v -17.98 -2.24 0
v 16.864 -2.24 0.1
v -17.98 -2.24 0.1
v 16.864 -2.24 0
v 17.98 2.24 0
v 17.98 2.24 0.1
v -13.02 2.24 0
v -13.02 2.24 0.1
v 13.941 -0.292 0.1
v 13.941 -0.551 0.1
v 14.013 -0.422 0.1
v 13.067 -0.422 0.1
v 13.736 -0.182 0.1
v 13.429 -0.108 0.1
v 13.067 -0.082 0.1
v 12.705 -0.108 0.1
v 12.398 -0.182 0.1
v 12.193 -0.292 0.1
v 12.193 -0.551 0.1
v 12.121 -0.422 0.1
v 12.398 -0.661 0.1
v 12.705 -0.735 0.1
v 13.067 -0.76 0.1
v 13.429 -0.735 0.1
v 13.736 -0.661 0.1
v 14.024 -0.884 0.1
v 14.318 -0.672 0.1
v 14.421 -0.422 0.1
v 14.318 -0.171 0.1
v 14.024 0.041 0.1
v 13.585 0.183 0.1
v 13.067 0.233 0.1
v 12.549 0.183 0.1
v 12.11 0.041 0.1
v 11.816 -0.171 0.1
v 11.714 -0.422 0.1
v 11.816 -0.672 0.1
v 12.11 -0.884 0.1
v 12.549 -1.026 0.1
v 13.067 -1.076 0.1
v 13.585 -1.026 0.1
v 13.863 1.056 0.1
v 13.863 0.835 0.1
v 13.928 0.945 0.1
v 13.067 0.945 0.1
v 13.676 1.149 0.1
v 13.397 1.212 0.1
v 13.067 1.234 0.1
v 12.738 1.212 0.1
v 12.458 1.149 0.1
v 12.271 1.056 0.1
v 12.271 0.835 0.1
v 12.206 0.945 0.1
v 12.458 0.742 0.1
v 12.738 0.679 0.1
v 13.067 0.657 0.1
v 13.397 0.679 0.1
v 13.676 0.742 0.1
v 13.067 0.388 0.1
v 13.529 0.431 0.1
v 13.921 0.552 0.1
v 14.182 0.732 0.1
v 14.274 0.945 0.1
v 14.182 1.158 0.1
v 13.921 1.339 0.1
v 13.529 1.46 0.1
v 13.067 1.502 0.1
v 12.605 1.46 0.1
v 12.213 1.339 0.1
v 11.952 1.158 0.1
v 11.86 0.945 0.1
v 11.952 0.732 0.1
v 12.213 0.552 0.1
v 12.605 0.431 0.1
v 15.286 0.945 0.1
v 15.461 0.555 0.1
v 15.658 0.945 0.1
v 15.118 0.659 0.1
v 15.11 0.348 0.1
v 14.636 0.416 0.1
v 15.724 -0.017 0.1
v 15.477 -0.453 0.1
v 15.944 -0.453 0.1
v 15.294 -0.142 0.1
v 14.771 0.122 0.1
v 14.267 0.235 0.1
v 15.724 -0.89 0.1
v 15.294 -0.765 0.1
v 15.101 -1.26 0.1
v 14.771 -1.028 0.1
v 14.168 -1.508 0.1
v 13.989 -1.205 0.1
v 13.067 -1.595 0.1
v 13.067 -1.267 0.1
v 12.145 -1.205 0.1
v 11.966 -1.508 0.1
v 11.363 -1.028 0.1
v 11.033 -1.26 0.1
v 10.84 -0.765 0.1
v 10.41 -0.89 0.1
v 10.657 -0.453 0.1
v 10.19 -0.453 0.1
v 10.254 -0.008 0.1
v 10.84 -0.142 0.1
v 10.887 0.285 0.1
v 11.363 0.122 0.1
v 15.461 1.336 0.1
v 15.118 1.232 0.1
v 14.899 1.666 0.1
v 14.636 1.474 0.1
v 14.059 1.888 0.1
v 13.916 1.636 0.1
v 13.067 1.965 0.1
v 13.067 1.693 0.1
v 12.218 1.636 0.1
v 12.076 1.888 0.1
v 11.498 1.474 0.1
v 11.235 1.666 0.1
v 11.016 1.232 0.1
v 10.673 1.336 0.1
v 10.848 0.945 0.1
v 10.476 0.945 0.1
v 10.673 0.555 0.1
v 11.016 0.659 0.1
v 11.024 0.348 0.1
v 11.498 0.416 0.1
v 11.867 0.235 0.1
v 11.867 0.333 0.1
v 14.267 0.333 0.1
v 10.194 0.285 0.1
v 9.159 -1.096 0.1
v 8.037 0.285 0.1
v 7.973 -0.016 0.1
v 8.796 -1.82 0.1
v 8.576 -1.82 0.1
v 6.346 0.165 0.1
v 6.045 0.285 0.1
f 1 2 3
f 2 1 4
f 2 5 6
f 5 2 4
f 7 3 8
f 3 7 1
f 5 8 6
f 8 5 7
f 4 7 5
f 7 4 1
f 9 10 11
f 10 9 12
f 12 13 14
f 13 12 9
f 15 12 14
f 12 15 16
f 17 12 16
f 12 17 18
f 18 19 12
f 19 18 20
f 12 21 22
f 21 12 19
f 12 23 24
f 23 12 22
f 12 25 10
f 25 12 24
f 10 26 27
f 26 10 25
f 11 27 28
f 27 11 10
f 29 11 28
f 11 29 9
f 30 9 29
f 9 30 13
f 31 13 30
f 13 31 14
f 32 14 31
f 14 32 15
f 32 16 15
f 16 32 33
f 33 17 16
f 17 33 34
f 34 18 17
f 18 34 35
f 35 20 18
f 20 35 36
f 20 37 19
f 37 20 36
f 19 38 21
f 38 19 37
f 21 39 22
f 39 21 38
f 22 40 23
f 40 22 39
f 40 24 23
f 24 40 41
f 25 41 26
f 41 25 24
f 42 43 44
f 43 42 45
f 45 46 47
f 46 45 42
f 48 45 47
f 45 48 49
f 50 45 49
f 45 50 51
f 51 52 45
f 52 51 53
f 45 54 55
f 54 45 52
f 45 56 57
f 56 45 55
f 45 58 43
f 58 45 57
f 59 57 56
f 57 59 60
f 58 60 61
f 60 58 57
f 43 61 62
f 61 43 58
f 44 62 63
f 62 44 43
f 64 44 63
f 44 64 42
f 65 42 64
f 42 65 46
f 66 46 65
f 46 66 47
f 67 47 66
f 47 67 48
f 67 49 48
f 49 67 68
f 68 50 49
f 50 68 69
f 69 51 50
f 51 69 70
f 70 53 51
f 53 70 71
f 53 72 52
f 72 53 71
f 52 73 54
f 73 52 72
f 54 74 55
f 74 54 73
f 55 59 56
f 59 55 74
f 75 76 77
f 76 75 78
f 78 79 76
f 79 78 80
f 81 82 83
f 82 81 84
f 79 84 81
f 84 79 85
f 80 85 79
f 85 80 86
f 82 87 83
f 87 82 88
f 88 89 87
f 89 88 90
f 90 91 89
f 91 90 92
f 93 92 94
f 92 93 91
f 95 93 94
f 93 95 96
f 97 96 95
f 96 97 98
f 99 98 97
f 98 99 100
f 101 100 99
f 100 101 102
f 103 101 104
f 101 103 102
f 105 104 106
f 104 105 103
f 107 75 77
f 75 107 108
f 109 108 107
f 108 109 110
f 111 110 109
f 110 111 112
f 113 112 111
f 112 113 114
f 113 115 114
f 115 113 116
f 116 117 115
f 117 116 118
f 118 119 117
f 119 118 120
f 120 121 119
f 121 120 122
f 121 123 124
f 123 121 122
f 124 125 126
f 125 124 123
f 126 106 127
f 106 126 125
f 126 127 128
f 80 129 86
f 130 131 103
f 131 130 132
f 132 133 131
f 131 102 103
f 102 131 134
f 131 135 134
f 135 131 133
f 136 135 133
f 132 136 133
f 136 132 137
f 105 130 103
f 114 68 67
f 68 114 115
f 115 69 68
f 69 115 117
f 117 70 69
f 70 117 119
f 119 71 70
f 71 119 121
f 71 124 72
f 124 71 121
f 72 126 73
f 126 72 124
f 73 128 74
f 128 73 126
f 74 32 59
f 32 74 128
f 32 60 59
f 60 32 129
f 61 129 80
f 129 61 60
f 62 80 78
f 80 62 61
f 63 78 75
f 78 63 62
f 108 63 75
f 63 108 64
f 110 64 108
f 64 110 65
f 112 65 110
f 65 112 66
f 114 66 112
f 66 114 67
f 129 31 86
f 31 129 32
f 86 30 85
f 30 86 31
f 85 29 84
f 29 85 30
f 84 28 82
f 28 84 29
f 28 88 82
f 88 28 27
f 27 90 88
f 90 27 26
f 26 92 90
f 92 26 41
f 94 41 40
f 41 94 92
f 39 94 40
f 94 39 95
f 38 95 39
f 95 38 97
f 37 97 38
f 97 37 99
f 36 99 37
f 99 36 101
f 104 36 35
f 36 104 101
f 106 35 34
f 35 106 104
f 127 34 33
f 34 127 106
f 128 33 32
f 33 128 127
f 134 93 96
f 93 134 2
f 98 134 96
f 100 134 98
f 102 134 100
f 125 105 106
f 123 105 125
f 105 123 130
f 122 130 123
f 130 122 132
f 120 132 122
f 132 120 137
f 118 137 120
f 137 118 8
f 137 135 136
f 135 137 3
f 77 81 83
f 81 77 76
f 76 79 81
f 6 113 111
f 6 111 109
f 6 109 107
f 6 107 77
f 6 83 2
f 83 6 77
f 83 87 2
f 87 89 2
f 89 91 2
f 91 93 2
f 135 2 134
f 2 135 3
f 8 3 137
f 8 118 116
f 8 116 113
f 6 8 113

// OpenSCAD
use <../lib.scad>
function ldraw_lib__4125165g() = [
// 0 Sticker  0.6 x  4.5 Trapezoid with White "v8" on Right Side on Red Background
// 0 Name: 4125165g.dat
// 0 Author: Max Martin Richter [MMR1988]
// 0 !LDRAW_ORG Part UPDATE 2019-03
// 0 !LICENSE Licensed under CC BY 2.0 and CC BY 4.0 : see CAreadme.txt
// 
// 0 BFC CERTIFY CCW
  [0,"BFC","CERTIFY"],
  [0,"BFC","CCW"],
// 
// 0 !KEYWORDS Set 8448
// 
// 0 !HISTORY 2019-12-27 [PTadmin] Official Update 2019-03
// 
// 
// 4 16 42.16 -.25 -5.6 -44.95 -.25 -5.6 -44.95 0 -5.6 42.16 0 -5.6
  [4,16,42.16,-.25,-5.6,-44.95,-.25,-5.6,-44.95,0,-5.6,42.16,0,-5.6],
// 4 16 42.16 -.25 -5.6 42.16 0 -5.6 44.95 0 5.6 44.95 -.25 5.6
  [4,16,42.16,-.25,-5.6,42.16,0,-5.6,44.95,0,5.6,44.95,-.25,5.6],
// 4 16 -32.55 -.25 5.6 -32.55 0 5.6 -44.95 0 -5.6 -44.95 -.25 -5.6
  [4,16,-32.55,-.25,5.6,-32.55,0,5.6,-44.95,0,-5.6,-44.95,-.25,-5.6],
// 4 16 44.95 0 5.6 -32.55 0 5.6 -32.55 -.25 5.6 44.95 -.25 5.6
  [4,16,44.95,0,5.6,-32.55,0,5.6,-32.55,-.25,5.6,44.95,-.25,5.6],
// 4 16 -32.55 0 5.6 44.95 0 5.6 42.16 0 -5.6 -44.95 0 -5.6
  [4,16,-32.55,0,5.6,44.95,0,5.6,42.16,0,-5.6,-44.95,0,-5.6],
// 
// 4 4 32.668 -0.25 -1.054 34.852 -0.25 -1.378 35.032 -0.25 -1.054 34.852 -0.25 -0.729
  [4,4,32.668,-0.25,-1.054,34.852,-0.25,-1.378,35.032,-0.25,-1.054,34.852,-0.25,-0.729],
// 4 4 32.668 -0.25 -1.054 34.852 -0.25 -0.729 34.339 -0.25 -0.454 33.572 -0.25 -0.271
  [4,4,32.668,-0.25,-1.054,34.852,-0.25,-0.729,34.339,-0.25,-0.454,33.572,-0.25,-0.271],
// 4 4 32.668 -0.25 -1.054 33.572 -0.25 -0.271 32.668 -0.25 -0.206 31.763 -0.25 -0.271
  [4,4,32.668,-0.25,-1.054,33.572,-0.25,-0.271,32.668,-0.25,-0.206,31.763,-0.25,-0.271],
// 4 4 32.668 -0.25 -1.054 31.763 -0.25 -0.271 30.996 -0.25 -0.454 30.483 -0.25 -0.729
  [4,4,32.668,-0.25,-1.054,31.763,-0.25,-0.271,30.996,-0.25,-0.454,30.483,-0.25,-0.729],
// 4 4 32.668 -0.25 -1.054 30.483 -0.25 -0.729 30.303 -0.25 -1.054 30.483 -0.25 -1.378
  [4,4,32.668,-0.25,-1.054,30.483,-0.25,-0.729,30.303,-0.25,-1.054,30.483,-0.25,-1.378],
// 4 4 32.668 -0.25 -1.054 30.483 -0.25 -1.378 30.996 -0.25 -1.653 31.763 -0.25 -1.837
  [4,4,32.668,-0.25,-1.054,30.483,-0.25,-1.378,30.996,-0.25,-1.653,31.763,-0.25,-1.837],
// 4 4 32.668 -0.25 -1.054 31.763 -0.25 -1.837 32.668 -0.25 -1.901 33.572 -0.25 -1.837
  [4,4,32.668,-0.25,-1.054,31.763,-0.25,-1.837,32.668,-0.25,-1.901,33.572,-0.25,-1.837],
// 4 4 32.668 -0.25 -1.054 33.572 -0.25 -1.837 34.339 -0.25 -1.653 34.852 -0.25 -1.378
  [4,4,32.668,-0.25,-1.054,33.572,-0.25,-1.837,34.339,-0.25,-1.653,34.852,-0.25,-1.378],
// 4 15 34.339 -0.25 -1.653 35.06 -0.25 -2.21 35.794 -0.25 -1.68 34.852 -0.25 -1.378
  [4,15,34.339,-0.25,-1.653,35.06,-0.25,-2.21,35.794,-0.25,-1.68,34.852,-0.25,-1.378],
// 4 15 34.852 -0.25 -1.378 35.794 -0.25 -1.68 36.052 -0.25 -1.054 35.032 -0.25 -1.054
  [4,15,34.852,-0.25,-1.378,35.794,-0.25,-1.68,36.052,-0.25,-1.054,35.032,-0.25,-1.054],
// 4 15 35.032 -0.25 -1.054 36.052 -0.25 -1.054 35.794 -0.25 -0.428 34.852 -0.25 -0.729
  [4,15,35.032,-0.25,-1.054,36.052,-0.25,-1.054,35.794,-0.25,-0.428,34.852,-0.25,-0.729],
// 4 15 34.852 -0.25 -0.729 35.794 -0.25 -0.428 35.06 -0.25 0.103 34.339 -0.25 -0.454
  [4,15,34.852,-0.25,-0.729,35.794,-0.25,-0.428,35.06,-0.25,0.103,34.339,-0.25,-0.454],
// 4 15 34.339 -0.25 -0.454 35.06 -0.25 0.103 33.963 -0.25 0.458 33.572 -0.25 -0.271
  [4,15,34.339,-0.25,-0.454,35.06,-0.25,0.103,33.963,-0.25,0.458,33.572,-0.25,-0.271],
// 4 15 33.572 -0.25 -0.271 33.963 -0.25 0.458 32.668 -0.25 0.582 32.668 -0.25 -0.206
  [4,15,33.572,-0.25,-0.271,33.963,-0.25,0.458,32.668,-0.25,0.582,32.668,-0.25,-0.206],
// 4 15 32.668 -0.25 -0.206 32.668 -0.25 0.582 31.373 -0.25 0.458 31.763 -0.25 -0.271
  [4,15,32.668,-0.25,-0.206,32.668,-0.25,0.582,31.373,-0.25,0.458,31.763,-0.25,-0.271],
// 4 15 31.763 -0.25 -0.271 31.373 -0.25 0.458 30.275 -0.25 0.103 30.996 -0.25 -0.454
  [4,15,31.763,-0.25,-0.271,31.373,-0.25,0.458,30.275,-0.25,0.103,30.996,-0.25,-0.454],
// 4 15 30.996 -0.25 -0.454 30.275 -0.25 0.103 29.541 -0.25 -0.428 30.483 -0.25 -0.729
  [4,15,30.996,-0.25,-0.454,30.275,-0.25,0.103,29.541,-0.25,-0.428,30.483,-0.25,-0.729],
// 4 15 30.483 -0.25 -0.729 29.541 -0.25 -0.428 29.284 -0.25 -1.054 30.303 -0.25 -1.054
  [4,15,30.483,-0.25,-0.729,29.541,-0.25,-0.428,29.284,-0.25,-1.054,30.303,-0.25,-1.054],
// 4 15 30.303 -0.25 -1.054 29.284 -0.25 -1.054 29.541 -0.25 -1.68 30.483 -0.25 -1.378
  [4,15,30.303,-0.25,-1.054,29.284,-0.25,-1.054,29.541,-0.25,-1.68,30.483,-0.25,-1.378],
// 4 15 30.483 -0.25 -1.378 29.541 -0.25 -1.68 30.275 -0.25 -2.21 30.996 -0.25 -1.653
  [4,15,30.483,-0.25,-1.378,29.541,-0.25,-1.68,30.275,-0.25,-2.21,30.996,-0.25,-1.653],
// 4 15 30.996 -0.25 -1.653 30.275 -0.25 -2.21 31.373 -0.25 -2.565 31.763 -0.25 -1.837
  [4,15,30.996,-0.25,-1.653,30.275,-0.25,-2.21,31.373,-0.25,-2.565,31.763,-0.25,-1.837],
// 4 15 31.763 -0.25 -1.837 31.373 -0.25 -2.565 32.668 -0.25 -2.689 32.668 -0.25 -1.901
  [4,15,31.763,-0.25,-1.837,31.373,-0.25,-2.565,32.668,-0.25,-2.689,32.668,-0.25,-1.901],
// 4 15 32.668 -0.25 -1.901 32.668 -0.25 -2.689 33.963 -0.25 -2.565 33.572 -0.25 -1.837
  [4,15,32.668,-0.25,-1.901,32.668,-0.25,-2.689,33.963,-0.25,-2.565,33.572,-0.25,-1.837],
// 4 15 33.572 -0.25 -1.837 33.963 -0.25 -2.565 35.06 -0.25 -2.21 34.339 -0.25 -1.653
  [4,15,33.572,-0.25,-1.837,33.963,-0.25,-2.565,35.06,-0.25,-2.21,34.339,-0.25,-1.653],
// 4 4 32.668 -0.25 2.363 34.657 -0.25 2.087 34.821 -0.25 2.363 34.657 -0.25 2.639
  [4,4,32.668,-0.25,2.363,34.657,-0.25,2.087,34.821,-0.25,2.363,34.657,-0.25,2.639],
// 4 4 32.668 -0.25 2.363 34.657 -0.25 2.639 34.19 -0.25 2.873 33.492 -0.25 3.029
  [4,4,32.668,-0.25,2.363,34.657,-0.25,2.639,34.19,-0.25,2.873,33.492,-0.25,3.029],
// 4 4 32.668 -0.25 2.363 33.492 -0.25 3.029 32.668 -0.25 3.084 31.844 -0.25 3.029
  [4,4,32.668,-0.25,2.363,33.492,-0.25,3.029,32.668,-0.25,3.084,31.844,-0.25,3.029],
// 4 4 32.668 -0.25 2.363 31.844 -0.25 3.029 31.145 -0.25 2.873 30.678 -0.25 2.639
  [4,4,32.668,-0.25,2.363,31.844,-0.25,3.029,31.145,-0.25,2.873,30.678,-0.25,2.639],
// 4 4 32.668 -0.25 2.363 30.678 -0.25 2.639 30.515 -0.25 2.363 30.678 -0.25 2.087
  [4,4,32.668,-0.25,2.363,30.678,-0.25,2.639,30.515,-0.25,2.363,30.678,-0.25,2.087],
// 4 4 32.668 -0.25 2.363 30.678 -0.25 2.087 31.145 -0.25 1.854 31.844 -0.25 1.697
  [4,4,32.668,-0.25,2.363,30.678,-0.25,2.087,31.145,-0.25,1.854,31.844,-0.25,1.697],
// 4 4 32.668 -0.25 2.363 31.844 -0.25 1.697 32.668 -0.25 1.643 33.492 -0.25 1.697
  [4,4,32.668,-0.25,2.363,31.844,-0.25,1.697,32.668,-0.25,1.643,33.492,-0.25,1.697],
// 4 4 32.668 -0.25 2.363 33.492 -0.25 1.697 34.19 -0.25 1.854 34.657 -0.25 2.087
  [4,4,32.668,-0.25,2.363,33.492,-0.25,1.697,34.19,-0.25,1.854,34.657,-0.25,2.087],
// 4 15 33.492 -0.25 1.697 32.668 -0.25 1.643 32.668 -0.25 0.971 33.823 -0.25 1.077
  [4,15,33.492,-0.25,1.697,32.668,-0.25,1.643,32.668,-0.25,0.971,33.823,-0.25,1.077],
// 4 15 34.19 -0.25 1.854 33.492 -0.25 1.697 33.823 -0.25 1.077 34.802 -0.25 1.379
  [4,15,34.19,-0.25,1.854,33.492,-0.25,1.697,33.823,-0.25,1.077,34.802,-0.25,1.379],
// 4 15 34.657 -0.25 2.087 34.19 -0.25 1.854 34.802 -0.25 1.379 35.456 -0.25 1.83
  [4,15,34.657,-0.25,2.087,34.19,-0.25,1.854,34.802,-0.25,1.379,35.456,-0.25,1.83],
// 4 15 34.821 -0.25 2.363 34.657 -0.25 2.087 35.456 -0.25 1.83 35.686 -0.25 2.363
  [4,15,34.821,-0.25,2.363,34.657,-0.25,2.087,35.456,-0.25,1.83,35.686,-0.25,2.363],
// 4 15 34.657 -0.25 2.639 34.821 -0.25 2.363 35.686 -0.25 2.363 35.456 -0.25 2.896
  [4,15,34.657,-0.25,2.639,34.821,-0.25,2.363,35.686,-0.25,2.363,35.456,-0.25,2.896],
// 4 15 34.19 -0.25 2.873 34.657 -0.25 2.639 35.456 -0.25 2.896 34.802 -0.25 3.348
  [4,15,34.19,-0.25,2.873,34.657,-0.25,2.639,35.456,-0.25,2.896,34.802,-0.25,3.348],
// 4 15 33.492 -0.25 3.029 34.19 -0.25 2.873 34.802 -0.25 3.348 33.823 -0.25 3.65
  [4,15,33.492,-0.25,3.029,34.19,-0.25,2.873,34.802,-0.25,3.348,33.823,-0.25,3.65],
// 4 15 32.668 -0.25 3.084 33.492 -0.25 3.029 33.823 -0.25 3.65 32.668 -0.25 3.756
  [4,15,32.668,-0.25,3.084,33.492,-0.25,3.029,33.823,-0.25,3.65,32.668,-0.25,3.756],
// 4 15 31.844 -0.25 3.029 32.668 -0.25 3.084 32.668 -0.25 3.756 31.513 -0.25 3.65
  [4,15,31.844,-0.25,3.029,32.668,-0.25,3.084,32.668,-0.25,3.756,31.513,-0.25,3.65],
// 4 15 31.145 -0.25 2.873 31.844 -0.25 3.029 31.513 -0.25 3.65 30.533 -0.25 3.348
  [4,15,31.145,-0.25,2.873,31.844,-0.25,3.029,31.513,-0.25,3.65,30.533,-0.25,3.348],
// 4 15 30.678 -0.25 2.639 31.145 -0.25 2.873 30.533 -0.25 3.348 29.879 -0.25 2.896
  [4,15,30.678,-0.25,2.639,31.145,-0.25,2.873,30.533,-0.25,3.348,29.879,-0.25,2.896],
// 4 15 30.515 -0.25 2.363 30.678 -0.25 2.639 29.879 -0.25 2.896 29.649 -0.25 2.363
  [4,15,30.515,-0.25,2.363,30.678,-0.25,2.639,29.879,-0.25,2.896,29.649,-0.25,2.363],
// 4 15 30.678 -0.25 2.087 30.515 -0.25 2.363 29.649 -0.25 2.363 29.879 -0.25 1.83
  [4,15,30.678,-0.25,2.087,30.515,-0.25,2.363,29.649,-0.25,2.363,29.879,-0.25,1.83],
// 4 15 31.145 -0.25 1.854 30.678 -0.25 2.087 29.879 -0.25 1.83 30.533 -0.25 1.379
  [4,15,31.145,-0.25,1.854,30.678,-0.25,2.087,29.879,-0.25,1.83,30.533,-0.25,1.379],
// 4 15 31.844 -0.25 1.697 31.145 -0.25 1.854 30.533 -0.25 1.379 31.513 -0.25 1.077
  [4,15,31.844,-0.25,1.697,31.145,-0.25,1.854,30.533,-0.25,1.379,31.513,-0.25,1.077],
// 4 15 32.668 -0.25 1.643 31.844 -0.25 1.697 31.513 -0.25 1.077 32.668 -0.25 0.971
  [4,15,32.668,-0.25,1.643,31.844,-0.25,1.697,31.513,-0.25,1.077,32.668,-0.25,0.971],
// 4 15 38.652 -0.25 1.387 39.145 -0.25 2.363 38.216 -0.25 2.363 37.794 -0.25 1.648
  [4,15,38.652,-0.25,1.387,39.145,-0.25,2.363,38.216,-0.25,2.363,37.794,-0.25,1.648],
// 4 15 37.775 -0.25 0.871 38.652 -0.25 1.387 37.794 -0.25 1.648 36.591 -0.25 1.041
  [4,15,37.775,-0.25,0.871,38.652,-0.25,1.387,37.794,-0.25,1.648,36.591,-0.25,1.041],
// 4 15 38.693 -0.25 -1.133 39.859 -0.25 -1.133 39.311 -0.25 -0.042 38.234 -0.25 -0.355
  [4,15,38.693,-0.25,-1.133,39.859,-0.25,-1.133,39.311,-0.25,-0.042,38.234,-0.25,-0.355],
// 4 15 38.234 -0.25 -0.355 39.311 -0.25 -0.042 37.775 -0.25 0.871 36.928 -0.25 0.304
  [4,15,38.234,-0.25,-0.355,39.311,-0.25,-0.042,37.775,-0.25,0.871,36.928,-0.25,0.304],
// 4 15 36.928 -0.25 0.304 37.775 -0.25 0.871 36.591 -0.25 1.041 35.667 -0.25 0.588
  [4,15,36.928,-0.25,0.304,37.775,-0.25,0.871,36.591,-0.25,1.041,35.667,-0.25,0.588],
// 4 15 39.311 -0.25 -2.225 39.859 -0.25 -1.133 38.693 -0.25 -1.133 38.234 -0.25 -1.912
  [4,15,39.311,-0.25,-2.225,39.859,-0.25,-1.133,38.693,-0.25,-1.133,38.234,-0.25,-1.912],
// 4 15 37.753 -0.25 -3.151 39.311 -0.25 -2.225 38.234 -0.25 -1.912 36.928 -0.25 -2.571
  [4,15,37.753,-0.25,-3.151,39.311,-0.25,-2.225,38.234,-0.25,-1.912,36.928,-0.25,-2.571],
// 4 15 35.42 -0.25 -3.77 37.753 -0.25 -3.151 36.928 -0.25 -2.571 34.973 -0.25 -3.012
  [4,15,35.42,-0.25,-3.77,37.753,-0.25,-3.151,36.928,-0.25,-2.571,34.973,-0.25,-3.012],
// 4 15 32.668 -0.25 -3.987 35.42 -0.25 -3.77 34.973 -0.25 -3.012 32.668 -0.25 -3.167
  [4,15,32.668,-0.25,-3.987,35.42,-0.25,-3.77,34.973,-0.25,-3.012,32.668,-0.25,-3.167],
// 4 15 29.916 -0.25 -3.77 32.668 -0.25 -3.987 32.668 -0.25 -3.167 30.362 -0.25 -3.012
  [4,15,29.916,-0.25,-3.77,32.668,-0.25,-3.987,32.668,-0.25,-3.167,30.362,-0.25,-3.012],
// 4 15 27.583 -0.25 -3.151 29.916 -0.25 -3.77 30.362 -0.25 -3.012 28.407 -0.25 -2.571
  [4,15,27.583,-0.25,-3.151,29.916,-0.25,-3.77,30.362,-0.25,-3.012,28.407,-0.25,-2.571],
// 4 15 26.024 -0.25 -2.225 27.583 -0.25 -3.151 28.407 -0.25 -2.571 27.101 -0.25 -1.912
  [4,15,26.024,-0.25,-2.225,27.583,-0.25,-3.151,28.407,-0.25,-2.571,27.101,-0.25,-1.912],
// 4 15 25.476 -0.25 -1.133 26.024 -0.25 -2.225 27.101 -0.25 -1.912 26.642 -0.25 -1.133
  [4,15,25.476,-0.25,-1.133,26.024,-0.25,-2.225,27.101,-0.25,-1.912,26.642,-0.25,-1.133],
// 4 15 25.635 -0.25 -0.02 25.476 -0.25 -1.133 26.642 -0.25 -1.133 27.101 -0.25 -0.355
  [4,15,25.635,-0.25,-0.02,25.476,-0.25,-1.133,26.642,-0.25,-1.133,27.101,-0.25,-0.355],
// 4 15 25.635 -0.25 -0.02 27.101 -0.25 -0.355 28.407 -0.25 0.304 27.218 -0.25 0.712
  [4,15,25.635,-0.25,-0.02,27.101,-0.25,-0.355,28.407,-0.25,0.304,27.218,-0.25,0.712],
// 4 15 38.216 -0.25 2.363 39.145 -0.25 2.363 38.652 -0.25 3.339 37.794 -0.25 3.079
  [4,15,38.216,-0.25,2.363,39.145,-0.25,2.363,38.652,-0.25,3.339,37.794,-0.25,3.079],
// 4 15 37.794 -0.25 3.079 38.652 -0.25 3.339 37.248 -0.25 4.166 36.591 -0.25 3.685
  [4,15,37.794,-0.25,3.079,38.652,-0.25,3.339,37.248,-0.25,4.166,36.591,-0.25,3.685],
// 4 15 36.591 -0.25 3.685 37.248 -0.25 4.166 35.147 -0.25 4.719 34.791 -0.25 4.091
  [4,15,36.591,-0.25,3.685,37.248,-0.25,4.166,35.147,-0.25,4.719,34.791,-0.25,4.091],
// 4 15 34.791 -0.25 4.091 35.147 -0.25 4.719 32.668 -0.25 4.913 32.668 -0.25 4.233
  [4,15,34.791,-0.25,4.091,35.147,-0.25,4.719,32.668,-0.25,4.913,32.668,-0.25,4.233],
// 4 15 32.668 -0.25 4.233 32.668 -0.25 4.913 30.189 -0.25 4.719 30.544 -0.25 4.091
  [4,15,32.668,-0.25,4.233,32.668,-0.25,4.913,30.189,-0.25,4.719,30.544,-0.25,4.091],
// 4 15 30.544 -0.25 4.091 30.189 -0.25 4.719 28.087 -0.25 4.166 28.744 -0.25 3.685
  [4,15,30.544,-0.25,4.091,30.189,-0.25,4.719,28.087,-0.25,4.166,28.744,-0.25,3.685],
// 4 15 28.744 -0.25 3.685 28.087 -0.25 4.166 26.683 -0.25 3.339 27.541 -0.25 3.079
  [4,15,28.744,-0.25,3.685,28.087,-0.25,4.166,26.683,-0.25,3.339,27.541,-0.25,3.079],
// 4 15 27.541 -0.25 3.079 26.683 -0.25 3.339 26.19 -0.25 2.363 27.119 -0.25 2.363
  [4,15,27.541,-0.25,3.079,26.683,-0.25,3.339,26.19,-0.25,2.363,27.119,-0.25,2.363],
// 4 15 27.119 -0.25 2.363 26.19 -0.25 2.363 26.683 -0.25 1.387 27.541 -0.25 1.648
  [4,15,27.119,-0.25,2.363,26.19,-0.25,2.363,26.683,-0.25,1.387,27.541,-0.25,1.648],
// 4 15 27.541 -0.25 1.648 26.683 -0.25 1.387 27.56 -0.25 0.871 28.744 -0.25 1.041
  [4,15,27.541,-0.25,1.648,26.683,-0.25,1.387,27.56,-0.25,0.871,28.744,-0.25,1.041],
// 4 15 28.744 -0.25 1.041 27.56 -0.25 0.871 28.407 -0.25 0.304 29.668 -0.25 0.588
  [4,15,28.744,-0.25,1.041,27.56,-0.25,0.871,28.407,-0.25,0.304,29.668,-0.25,0.588],
// 3 15 28.744 -0.25 1.041 29.668 -0.25 0.588 29.668 -0.25 0.833
  [3,15,28.744,-0.25,1.041,29.668,-0.25,0.588,29.668,-0.25,0.833],
// 3 15 36.591 -0.25 1.041 35.667 -0.25 0.833 35.667 -0.25 0.588
  [3,15,36.591,-0.25,1.041,35.667,-0.25,0.833,35.667,-0.25,0.588],
// 4 4 22.897 -0.25 -2.739 25.635 -0.25 -0.02 25.484 -0.25 0.712 20.093 -0.25 0.712
  [4,4,22.897,-0.25,-2.739,25.635,-0.25,-0.02,25.484,-0.25,0.712,20.093,-0.25,0.712],
// 3 4 20.093 -0.25 0.712 19.933 -0.25 -0.039 22.897 -0.25 -2.739
  [3,4,20.093,-0.25,0.712,19.933,-0.25,-0.039,22.897,-0.25,-2.739],
// 4 15 25.476 -0.25 -1.133 25.635 -0.25 -0.02 22.897 -0.25 -2.739 21.991 -0.25 -4.55
  [4,15,25.476,-0.25,-1.133,25.635,-0.25,-0.02,22.897,-0.25,-2.739,21.991,-0.25,-4.55],
// 4 15 21.441 -0.25 -4.55 21.991 -0.25 -4.55 22.897 -0.25 -2.739 19.933 -0.25 -0.039
  [4,15,21.441,-0.25,-4.55,21.991,-0.25,-4.55,22.897,-0.25,-2.739,19.933,-0.25,-0.039],
// 3 15 15.866 -0.25 0.413 21.441 -0.25 -4.55 19.933 -0.25 -0.039
  [3,15,15.866,-0.25,0.413,21.441,-0.25,-4.55,19.933,-0.25,-0.039],
// 4 15 15.112 -0.25 0.712 15.866 -0.25 0.413 19.933 -0.25 -0.039 20.093 -0.25 0.712
  [4,15,15.112,-0.25,0.712,15.866,-0.25,0.413,19.933,-0.25,-0.039,20.093,-0.25,0.712],
// 3 15 27.218 -0.25 0.712 25.484 -0.25 0.712 25.635 -0.25 -0.02
  [3,15,27.218,-0.25,0.712,25.484,-0.25,0.712,25.635,-0.25,-0.02],
// 4 4 31.513 -0.25 3.65 32.668 -0.25 3.756 32.668 -0.25 4.233 30.544 -0.25 4.091
  [4,4,31.513,-0.25,3.65,32.668,-0.25,3.756,32.668,-0.25,4.233,30.544,-0.25,4.091],
// 4 4 30.533 -0.25 3.348 31.513 -0.25 3.65 30.544 -0.25 4.091 28.744 -0.25 3.685
  [4,4,30.533,-0.25,3.348,31.513,-0.25,3.65,30.544,-0.25,4.091,28.744,-0.25,3.685],
// 4 4 29.879 -0.25 2.896 30.533 -0.25 3.348 28.744 -0.25 3.685 27.541 -0.25 3.079
  [4,4,29.879,-0.25,2.896,30.533,-0.25,3.348,28.744,-0.25,3.685,27.541,-0.25,3.079],
// 4 4 29.649 -0.25 2.363 29.879 -0.25 2.896 27.541 -0.25 3.079 27.119 -0.25 2.363
  [4,4,29.649,-0.25,2.363,29.879,-0.25,2.896,27.541,-0.25,3.079,27.119,-0.25,2.363],
// 4 4 29.879 -0.25 1.83 29.649 -0.25 2.363 27.119 -0.25 2.363 27.541 -0.25 1.648
  [4,4,29.879,-0.25,1.83,29.649,-0.25,2.363,27.119,-0.25,2.363,27.541,-0.25,1.648],
// 4 4 30.533 -0.25 1.379 29.879 -0.25 1.83 27.541 -0.25 1.648 28.744 -0.25 1.041
  [4,4,30.533,-0.25,1.379,29.879,-0.25,1.83,27.541,-0.25,1.648,28.744,-0.25,1.041],
// 4 4 31.513 -0.25 1.077 30.533 -0.25 1.379 28.744 -0.25 1.041 29.668 -0.25 0.833
  [4,4,31.513,-0.25,1.077,30.533,-0.25,1.379,28.744,-0.25,1.041,29.668,-0.25,0.833],
// 4 4 32.668 -0.25 0.971 31.513 -0.25 1.077 29.668 -0.25 0.833 32.668 -0.25 0.582
  [4,4,32.668,-0.25,0.971,31.513,-0.25,1.077,29.668,-0.25,0.833,32.668,-0.25,0.582],
// 4 4 32.668 -0.25 0.971 32.668 -0.25 0.582 35.667 -0.25 0.833 33.823 -0.25 1.077
  [4,4,32.668,-0.25,0.971,32.668,-0.25,0.582,35.667,-0.25,0.833,33.823,-0.25,1.077],
// 4 4 33.823 -0.25 1.077 35.667 -0.25 0.833 36.591 -0.25 1.041 34.802 -0.25 1.379
  [4,4,33.823,-0.25,1.077,35.667,-0.25,0.833,36.591,-0.25,1.041,34.802,-0.25,1.379],
// 4 4 34.802 -0.25 1.379 36.591 -0.25 1.041 37.794 -0.25 1.648 35.456 -0.25 1.83
  [4,4,34.802,-0.25,1.379,36.591,-0.25,1.041,37.794,-0.25,1.648,35.456,-0.25,1.83],
// 4 4 35.456 -0.25 1.83 37.794 -0.25 1.648 38.216 -0.25 2.363 35.686 -0.25 2.363
  [4,4,35.456,-0.25,1.83,37.794,-0.25,1.648,38.216,-0.25,2.363,35.686,-0.25,2.363],
// 4 4 35.686 -0.25 2.363 38.216 -0.25 2.363 37.794 -0.25 3.079 35.456 -0.25 2.896
  [4,4,35.686,-0.25,2.363,38.216,-0.25,2.363,37.794,-0.25,3.079,35.456,-0.25,2.896],
// 4 4 35.456 -0.25 2.896 37.794 -0.25 3.079 36.591 -0.25 3.685 34.802 -0.25 3.348
  [4,4,35.456,-0.25,2.896,37.794,-0.25,3.079,36.591,-0.25,3.685,34.802,-0.25,3.348],
// 4 4 34.802 -0.25 3.348 36.591 -0.25 3.685 34.791 -0.25 4.091 33.823 -0.25 3.65
  [4,4,34.802,-0.25,3.348,36.591,-0.25,3.685,34.791,-0.25,4.091,33.823,-0.25,3.65],
// 4 4 33.823 -0.25 3.65 34.791 -0.25 4.091 32.668 -0.25 4.233 32.668 -0.25 3.756
  [4,4,33.823,-0.25,3.65,34.791,-0.25,4.091,32.668,-0.25,4.233,32.668,-0.25,3.756],
// 4 4 35.667 -0.25 0.833 32.668 -0.25 0.582 33.963 -0.25 0.458 35.667 -0.25 0.588
  [4,4,35.667,-0.25,0.833,32.668,-0.25,0.582,33.963,-0.25,0.458,35.667,-0.25,0.588],
// 4 4 35.667 -0.25 0.588 33.963 -0.25 0.458 35.06 -0.25 0.103 36.928 -0.25 0.304
  [4,4,35.667,-0.25,0.588,33.963,-0.25,0.458,35.06,-0.25,0.103,36.928,-0.25,0.304],
// 4 4 36.928 -0.25 0.304 35.06 -0.25 0.103 35.794 -0.25 -0.428 38.234 -0.25 -0.355
  [4,4,36.928,-0.25,0.304,35.06,-0.25,0.103,35.794,-0.25,-0.428,38.234,-0.25,-0.355],
// 4 4 38.234 -0.25 -0.355 35.794 -0.25 -0.428 36.052 -0.25 -1.054 38.693 -0.25 -1.133
  [4,4,38.234,-0.25,-0.355,35.794,-0.25,-0.428,36.052,-0.25,-1.054,38.693,-0.25,-1.133],
// 4 4 38.693 -0.25 -1.133 36.052 -0.25 -1.054 35.794 -0.25 -1.68 38.234 -0.25 -1.912
  [4,4,38.693,-0.25,-1.133,36.052,-0.25,-1.054,35.794,-0.25,-1.68,38.234,-0.25,-1.912],
// 4 4 38.234 -0.25 -1.912 35.794 -0.25 -1.68 35.06 -0.25 -2.21 36.928 -0.25 -2.571
  [4,4,38.234,-0.25,-1.912,35.794,-0.25,-1.68,35.06,-0.25,-2.21,36.928,-0.25,-2.571],
// 4 4 36.928 -0.25 -2.571 35.06 -0.25 -2.21 33.963 -0.25 -2.565 34.973 -0.25 -3.012
  [4,4,36.928,-0.25,-2.571,35.06,-0.25,-2.21,33.963,-0.25,-2.565,34.973,-0.25,-3.012],
// 4 4 34.973 -0.25 -3.012 33.963 -0.25 -2.565 32.668 -0.25 -2.689 32.668 -0.25 -3.167
  [4,4,34.973,-0.25,-3.012,33.963,-0.25,-2.565,32.668,-0.25,-2.689,32.668,-0.25,-3.167],
// 4 4 30.362 -0.25 -3.012 32.668 -0.25 -3.167 32.668 -0.25 -2.689 31.373 -0.25 -2.565
  [4,4,30.362,-0.25,-3.012,32.668,-0.25,-3.167,32.668,-0.25,-2.689,31.373,-0.25,-2.565],
// 4 4 28.407 -0.25 -2.571 30.362 -0.25 -3.012 31.373 -0.25 -2.565 30.275 -0.25 -2.21
  [4,4,28.407,-0.25,-2.571,30.362,-0.25,-3.012,31.373,-0.25,-2.565,30.275,-0.25,-2.21],
// 4 4 27.101 -0.25 -1.912 28.407 -0.25 -2.571 30.275 -0.25 -2.21 29.541 -0.25 -1.68
  [4,4,27.101,-0.25,-1.912,28.407,-0.25,-2.571,30.275,-0.25,-2.21,29.541,-0.25,-1.68],
// 4 4 26.642 -0.25 -1.133 27.101 -0.25 -1.912 29.541 -0.25 -1.68 29.284 -0.25 -1.054
  [4,4,26.642,-0.25,-1.133,27.101,-0.25,-1.912,29.541,-0.25,-1.68,29.284,-0.25,-1.054],
// 4 4 27.101 -0.25 -0.355 26.642 -0.25 -1.133 29.284 -0.25 -1.054 29.541 -0.25 -0.428
  [4,4,27.101,-0.25,-0.355,26.642,-0.25,-1.133,29.284,-0.25,-1.054,29.541,-0.25,-0.428],
// 4 4 28.407 -0.25 0.304 27.101 -0.25 -0.355 29.541 -0.25 -0.428 30.275 -0.25 0.103
  [4,4,28.407,-0.25,0.304,27.101,-0.25,-0.355,29.541,-0.25,-0.428,30.275,-0.25,0.103],
// 4 4 29.668 -0.25 0.588 28.407 -0.25 0.304 30.275 -0.25 0.103 31.373 -0.25 0.458
  [4,4,29.668,-0.25,0.588,28.407,-0.25,0.304,30.275,-0.25,0.103,31.373,-0.25,0.458],
// 4 4 29.668 -0.25 0.833 29.668 -0.25 0.588 31.373 -0.25 0.458 32.668 -0.25 0.582
  [4,4,29.668,-0.25,0.833,29.668,-0.25,0.588,31.373,-0.25,0.458,32.668,-0.25,0.582],
// 4 4 32.668 -0.25 -3.987 29.916 -0.25 -3.77 21.991 -0.25 -4.55 42.16 -0.25 -5.6
  [4,4,32.668,-0.25,-3.987,29.916,-0.25,-3.77,21.991,-0.25,-4.55,42.16,-0.25,-5.6],
// 3 4 27.583 -0.25 -3.151 21.991 -0.25 -4.55 29.916 -0.25 -3.77
  [3,4,27.583,-0.25,-3.151,21.991,-0.25,-4.55,29.916,-0.25,-3.77],
// 3 4 26.024 -0.25 -2.225 21.991 -0.25 -4.55 27.583 -0.25 -3.151
  [3,4,26.024,-0.25,-2.225,21.991,-0.25,-4.55,27.583,-0.25,-3.151],
// 3 4 25.476 -0.25 -1.133 21.991 -0.25 -4.55 26.024 -0.25 -2.225
  [3,4,25.476,-0.25,-1.133,21.991,-0.25,-4.55,26.024,-0.25,-2.225],
// 3 15 27.56 -0.25 0.871 27.218 -0.25 0.712 28.407 -0.25 0.304
  [3,15,27.56,-0.25,0.871,27.218,-0.25,0.712,28.407,-0.25,0.304],
// 4 4 27.218 -0.25 0.712 27.56 -0.25 0.871 26.683 -0.25 1.387 25.484 -0.25 0.712
  [4,4,27.218,-0.25,0.712,27.56,-0.25,0.871,26.683,-0.25,1.387,25.484,-0.25,0.712],
// 4 4 25.484 -0.25 0.712 26.683 -0.25 1.387 26.19 -0.25 2.363 20.093 -0.25 0.712
  [4,4,25.484,-0.25,0.712,26.683,-0.25,1.387,26.19,-0.25,2.363,20.093,-0.25,0.712],
// 4 4 20.093 -0.25 0.712 26.19 -0.25 2.363 26.683 -0.25 3.339 15.112 -0.25 0.712
  [4,4,20.093,-0.25,0.712,26.19,-0.25,2.363,26.683,-0.25,3.339,15.112,-0.25,0.712],
// 4 4 15.112 -0.25 0.712 26.683 -0.25 3.339 28.087 -0.25 4.166 -32.55 -0.25 5.6
  [4,4,15.112,-0.25,0.712,26.683,-0.25,3.339,28.087,-0.25,4.166,-32.55,-0.25,5.6],
// 4 4 21.441 -0.25 -4.55 15.866 -0.25 0.413 15.112 -0.25 0.712 -44.95 -0.25 -5.6
  [4,4,21.441,-0.25,-4.55,15.866,-0.25,0.413,15.112,-0.25,0.712,-44.95,-0.25,-5.6],
// 4 4 39.311 -0.25 -0.042 39.859 -0.25 -1.133 39.145 -0.25 2.363 38.652 -0.25 1.387
  [4,4,39.311,-0.25,-0.042,39.859,-0.25,-1.133,39.145,-0.25,2.363,38.652,-0.25,1.387],
// 3 4 38.652 -0.25 1.387 37.775 -0.25 0.871 39.311 -0.25 -0.042
  [3,4,38.652,-0.25,1.387,37.775,-0.25,0.871,39.311,-0.25,-0.042],
// 3 4 44.95 -0.25 5.6 32.668 -0.25 4.913 35.147 -0.25 4.719
  [3,4,44.95,-0.25,5.6,32.668,-0.25,4.913,35.147,-0.25,4.719],
// 3 4 44.95 -0.25 5.6 35.147 -0.25 4.719 37.248 -0.25 4.166
  [3,4,44.95,-0.25,5.6,35.147,-0.25,4.719,37.248,-0.25,4.166],
// 3 4 44.95 -0.25 5.6 37.248 -0.25 4.166 38.652 -0.25 3.339
  [3,4,44.95,-0.25,5.6,37.248,-0.25,4.166,38.652,-0.25,3.339],
// 3 4 44.95 -0.25 5.6 38.652 -0.25 3.339 39.145 -0.25 2.363
  [3,4,44.95,-0.25,5.6,38.652,-0.25,3.339,39.145,-0.25,2.363],
// 4 4 44.95 -0.25 5.6 39.145 -0.25 2.363 39.859 -0.25 -1.133 42.16 -0.25 -5.6
  [4,4,44.95,-0.25,5.6,39.145,-0.25,2.363,39.859,-0.25,-1.133,42.16,-0.25,-5.6],
// 3 4 39.859 -0.25 -1.133 39.311 -0.25 -2.225 42.16 -0.25 -5.6
  [3,4,39.859,-0.25,-1.133,39.311,-0.25,-2.225,42.16,-0.25,-5.6],
// 3 4 39.311 -0.25 -2.225 37.753 -0.25 -3.151 42.16 -0.25 -5.6
  [3,4,39.311,-0.25,-2.225,37.753,-0.25,-3.151,42.16,-0.25,-5.6],
// 3 4 37.753 -0.25 -3.151 35.42 -0.25 -3.77 42.16 -0.25 -5.6
  [3,4,37.753,-0.25,-3.151,35.42,-0.25,-3.77,42.16,-0.25,-5.6],
// 3 4 35.42 -0.25 -3.77 32.668 -0.25 -3.987 42.16 -0.25 -5.6
  [3,4,35.42,-0.25,-3.77,32.668,-0.25,-3.987,42.16,-0.25,-5.6],
// 4 4 42.16 -0.25 -5.6 21.991 -0.25 -4.55 21.441 -0.25 -4.55 -44.95 -0.25 -5.6
  [4,4,42.16,-0.25,-5.6,21.991,-0.25,-4.55,21.441,-0.25,-4.55,-44.95,-0.25,-5.6],
// 3 4 -32.55 -0.25 5.6 -44.95 -0.25 -5.6 15.112 -0.25 0.712
  [3,4,-32.55,-0.25,5.6,-44.95,-0.25,-5.6,15.112,-0.25,0.712],
// 3 4 -32.55 -0.25 5.6 28.087 -0.25 4.166 30.189 -0.25 4.719
  [3,4,-32.55,-0.25,5.6,28.087,-0.25,4.166,30.189,-0.25,4.719],
// 3 4 -32.55 -0.25 5.6 30.189 -0.25 4.719 32.668 -0.25 4.913
  [3,4,-32.55,-0.25,5.6,30.189,-0.25,4.719,32.668,-0.25,4.913],
// 3 4 44.95 -0.25 5.6 -32.55 -0.25 5.6 32.668 -0.25 4.913
  [3,4,44.95,-0.25,5.6,-32.55,-0.25,5.6,32.668,-0.25,4.913],
];
module ldraw_lib__4125165g(step=0, col=false, unit=2/5, alt=false, line=0.2, solid=!$preview)
    makepoly(ldraw_lib__4125165g(), step=step, col=col, unit=unit, alt=alt, line=line, solid=solid);
ldraw_lib__4125165g(line=0.2);
